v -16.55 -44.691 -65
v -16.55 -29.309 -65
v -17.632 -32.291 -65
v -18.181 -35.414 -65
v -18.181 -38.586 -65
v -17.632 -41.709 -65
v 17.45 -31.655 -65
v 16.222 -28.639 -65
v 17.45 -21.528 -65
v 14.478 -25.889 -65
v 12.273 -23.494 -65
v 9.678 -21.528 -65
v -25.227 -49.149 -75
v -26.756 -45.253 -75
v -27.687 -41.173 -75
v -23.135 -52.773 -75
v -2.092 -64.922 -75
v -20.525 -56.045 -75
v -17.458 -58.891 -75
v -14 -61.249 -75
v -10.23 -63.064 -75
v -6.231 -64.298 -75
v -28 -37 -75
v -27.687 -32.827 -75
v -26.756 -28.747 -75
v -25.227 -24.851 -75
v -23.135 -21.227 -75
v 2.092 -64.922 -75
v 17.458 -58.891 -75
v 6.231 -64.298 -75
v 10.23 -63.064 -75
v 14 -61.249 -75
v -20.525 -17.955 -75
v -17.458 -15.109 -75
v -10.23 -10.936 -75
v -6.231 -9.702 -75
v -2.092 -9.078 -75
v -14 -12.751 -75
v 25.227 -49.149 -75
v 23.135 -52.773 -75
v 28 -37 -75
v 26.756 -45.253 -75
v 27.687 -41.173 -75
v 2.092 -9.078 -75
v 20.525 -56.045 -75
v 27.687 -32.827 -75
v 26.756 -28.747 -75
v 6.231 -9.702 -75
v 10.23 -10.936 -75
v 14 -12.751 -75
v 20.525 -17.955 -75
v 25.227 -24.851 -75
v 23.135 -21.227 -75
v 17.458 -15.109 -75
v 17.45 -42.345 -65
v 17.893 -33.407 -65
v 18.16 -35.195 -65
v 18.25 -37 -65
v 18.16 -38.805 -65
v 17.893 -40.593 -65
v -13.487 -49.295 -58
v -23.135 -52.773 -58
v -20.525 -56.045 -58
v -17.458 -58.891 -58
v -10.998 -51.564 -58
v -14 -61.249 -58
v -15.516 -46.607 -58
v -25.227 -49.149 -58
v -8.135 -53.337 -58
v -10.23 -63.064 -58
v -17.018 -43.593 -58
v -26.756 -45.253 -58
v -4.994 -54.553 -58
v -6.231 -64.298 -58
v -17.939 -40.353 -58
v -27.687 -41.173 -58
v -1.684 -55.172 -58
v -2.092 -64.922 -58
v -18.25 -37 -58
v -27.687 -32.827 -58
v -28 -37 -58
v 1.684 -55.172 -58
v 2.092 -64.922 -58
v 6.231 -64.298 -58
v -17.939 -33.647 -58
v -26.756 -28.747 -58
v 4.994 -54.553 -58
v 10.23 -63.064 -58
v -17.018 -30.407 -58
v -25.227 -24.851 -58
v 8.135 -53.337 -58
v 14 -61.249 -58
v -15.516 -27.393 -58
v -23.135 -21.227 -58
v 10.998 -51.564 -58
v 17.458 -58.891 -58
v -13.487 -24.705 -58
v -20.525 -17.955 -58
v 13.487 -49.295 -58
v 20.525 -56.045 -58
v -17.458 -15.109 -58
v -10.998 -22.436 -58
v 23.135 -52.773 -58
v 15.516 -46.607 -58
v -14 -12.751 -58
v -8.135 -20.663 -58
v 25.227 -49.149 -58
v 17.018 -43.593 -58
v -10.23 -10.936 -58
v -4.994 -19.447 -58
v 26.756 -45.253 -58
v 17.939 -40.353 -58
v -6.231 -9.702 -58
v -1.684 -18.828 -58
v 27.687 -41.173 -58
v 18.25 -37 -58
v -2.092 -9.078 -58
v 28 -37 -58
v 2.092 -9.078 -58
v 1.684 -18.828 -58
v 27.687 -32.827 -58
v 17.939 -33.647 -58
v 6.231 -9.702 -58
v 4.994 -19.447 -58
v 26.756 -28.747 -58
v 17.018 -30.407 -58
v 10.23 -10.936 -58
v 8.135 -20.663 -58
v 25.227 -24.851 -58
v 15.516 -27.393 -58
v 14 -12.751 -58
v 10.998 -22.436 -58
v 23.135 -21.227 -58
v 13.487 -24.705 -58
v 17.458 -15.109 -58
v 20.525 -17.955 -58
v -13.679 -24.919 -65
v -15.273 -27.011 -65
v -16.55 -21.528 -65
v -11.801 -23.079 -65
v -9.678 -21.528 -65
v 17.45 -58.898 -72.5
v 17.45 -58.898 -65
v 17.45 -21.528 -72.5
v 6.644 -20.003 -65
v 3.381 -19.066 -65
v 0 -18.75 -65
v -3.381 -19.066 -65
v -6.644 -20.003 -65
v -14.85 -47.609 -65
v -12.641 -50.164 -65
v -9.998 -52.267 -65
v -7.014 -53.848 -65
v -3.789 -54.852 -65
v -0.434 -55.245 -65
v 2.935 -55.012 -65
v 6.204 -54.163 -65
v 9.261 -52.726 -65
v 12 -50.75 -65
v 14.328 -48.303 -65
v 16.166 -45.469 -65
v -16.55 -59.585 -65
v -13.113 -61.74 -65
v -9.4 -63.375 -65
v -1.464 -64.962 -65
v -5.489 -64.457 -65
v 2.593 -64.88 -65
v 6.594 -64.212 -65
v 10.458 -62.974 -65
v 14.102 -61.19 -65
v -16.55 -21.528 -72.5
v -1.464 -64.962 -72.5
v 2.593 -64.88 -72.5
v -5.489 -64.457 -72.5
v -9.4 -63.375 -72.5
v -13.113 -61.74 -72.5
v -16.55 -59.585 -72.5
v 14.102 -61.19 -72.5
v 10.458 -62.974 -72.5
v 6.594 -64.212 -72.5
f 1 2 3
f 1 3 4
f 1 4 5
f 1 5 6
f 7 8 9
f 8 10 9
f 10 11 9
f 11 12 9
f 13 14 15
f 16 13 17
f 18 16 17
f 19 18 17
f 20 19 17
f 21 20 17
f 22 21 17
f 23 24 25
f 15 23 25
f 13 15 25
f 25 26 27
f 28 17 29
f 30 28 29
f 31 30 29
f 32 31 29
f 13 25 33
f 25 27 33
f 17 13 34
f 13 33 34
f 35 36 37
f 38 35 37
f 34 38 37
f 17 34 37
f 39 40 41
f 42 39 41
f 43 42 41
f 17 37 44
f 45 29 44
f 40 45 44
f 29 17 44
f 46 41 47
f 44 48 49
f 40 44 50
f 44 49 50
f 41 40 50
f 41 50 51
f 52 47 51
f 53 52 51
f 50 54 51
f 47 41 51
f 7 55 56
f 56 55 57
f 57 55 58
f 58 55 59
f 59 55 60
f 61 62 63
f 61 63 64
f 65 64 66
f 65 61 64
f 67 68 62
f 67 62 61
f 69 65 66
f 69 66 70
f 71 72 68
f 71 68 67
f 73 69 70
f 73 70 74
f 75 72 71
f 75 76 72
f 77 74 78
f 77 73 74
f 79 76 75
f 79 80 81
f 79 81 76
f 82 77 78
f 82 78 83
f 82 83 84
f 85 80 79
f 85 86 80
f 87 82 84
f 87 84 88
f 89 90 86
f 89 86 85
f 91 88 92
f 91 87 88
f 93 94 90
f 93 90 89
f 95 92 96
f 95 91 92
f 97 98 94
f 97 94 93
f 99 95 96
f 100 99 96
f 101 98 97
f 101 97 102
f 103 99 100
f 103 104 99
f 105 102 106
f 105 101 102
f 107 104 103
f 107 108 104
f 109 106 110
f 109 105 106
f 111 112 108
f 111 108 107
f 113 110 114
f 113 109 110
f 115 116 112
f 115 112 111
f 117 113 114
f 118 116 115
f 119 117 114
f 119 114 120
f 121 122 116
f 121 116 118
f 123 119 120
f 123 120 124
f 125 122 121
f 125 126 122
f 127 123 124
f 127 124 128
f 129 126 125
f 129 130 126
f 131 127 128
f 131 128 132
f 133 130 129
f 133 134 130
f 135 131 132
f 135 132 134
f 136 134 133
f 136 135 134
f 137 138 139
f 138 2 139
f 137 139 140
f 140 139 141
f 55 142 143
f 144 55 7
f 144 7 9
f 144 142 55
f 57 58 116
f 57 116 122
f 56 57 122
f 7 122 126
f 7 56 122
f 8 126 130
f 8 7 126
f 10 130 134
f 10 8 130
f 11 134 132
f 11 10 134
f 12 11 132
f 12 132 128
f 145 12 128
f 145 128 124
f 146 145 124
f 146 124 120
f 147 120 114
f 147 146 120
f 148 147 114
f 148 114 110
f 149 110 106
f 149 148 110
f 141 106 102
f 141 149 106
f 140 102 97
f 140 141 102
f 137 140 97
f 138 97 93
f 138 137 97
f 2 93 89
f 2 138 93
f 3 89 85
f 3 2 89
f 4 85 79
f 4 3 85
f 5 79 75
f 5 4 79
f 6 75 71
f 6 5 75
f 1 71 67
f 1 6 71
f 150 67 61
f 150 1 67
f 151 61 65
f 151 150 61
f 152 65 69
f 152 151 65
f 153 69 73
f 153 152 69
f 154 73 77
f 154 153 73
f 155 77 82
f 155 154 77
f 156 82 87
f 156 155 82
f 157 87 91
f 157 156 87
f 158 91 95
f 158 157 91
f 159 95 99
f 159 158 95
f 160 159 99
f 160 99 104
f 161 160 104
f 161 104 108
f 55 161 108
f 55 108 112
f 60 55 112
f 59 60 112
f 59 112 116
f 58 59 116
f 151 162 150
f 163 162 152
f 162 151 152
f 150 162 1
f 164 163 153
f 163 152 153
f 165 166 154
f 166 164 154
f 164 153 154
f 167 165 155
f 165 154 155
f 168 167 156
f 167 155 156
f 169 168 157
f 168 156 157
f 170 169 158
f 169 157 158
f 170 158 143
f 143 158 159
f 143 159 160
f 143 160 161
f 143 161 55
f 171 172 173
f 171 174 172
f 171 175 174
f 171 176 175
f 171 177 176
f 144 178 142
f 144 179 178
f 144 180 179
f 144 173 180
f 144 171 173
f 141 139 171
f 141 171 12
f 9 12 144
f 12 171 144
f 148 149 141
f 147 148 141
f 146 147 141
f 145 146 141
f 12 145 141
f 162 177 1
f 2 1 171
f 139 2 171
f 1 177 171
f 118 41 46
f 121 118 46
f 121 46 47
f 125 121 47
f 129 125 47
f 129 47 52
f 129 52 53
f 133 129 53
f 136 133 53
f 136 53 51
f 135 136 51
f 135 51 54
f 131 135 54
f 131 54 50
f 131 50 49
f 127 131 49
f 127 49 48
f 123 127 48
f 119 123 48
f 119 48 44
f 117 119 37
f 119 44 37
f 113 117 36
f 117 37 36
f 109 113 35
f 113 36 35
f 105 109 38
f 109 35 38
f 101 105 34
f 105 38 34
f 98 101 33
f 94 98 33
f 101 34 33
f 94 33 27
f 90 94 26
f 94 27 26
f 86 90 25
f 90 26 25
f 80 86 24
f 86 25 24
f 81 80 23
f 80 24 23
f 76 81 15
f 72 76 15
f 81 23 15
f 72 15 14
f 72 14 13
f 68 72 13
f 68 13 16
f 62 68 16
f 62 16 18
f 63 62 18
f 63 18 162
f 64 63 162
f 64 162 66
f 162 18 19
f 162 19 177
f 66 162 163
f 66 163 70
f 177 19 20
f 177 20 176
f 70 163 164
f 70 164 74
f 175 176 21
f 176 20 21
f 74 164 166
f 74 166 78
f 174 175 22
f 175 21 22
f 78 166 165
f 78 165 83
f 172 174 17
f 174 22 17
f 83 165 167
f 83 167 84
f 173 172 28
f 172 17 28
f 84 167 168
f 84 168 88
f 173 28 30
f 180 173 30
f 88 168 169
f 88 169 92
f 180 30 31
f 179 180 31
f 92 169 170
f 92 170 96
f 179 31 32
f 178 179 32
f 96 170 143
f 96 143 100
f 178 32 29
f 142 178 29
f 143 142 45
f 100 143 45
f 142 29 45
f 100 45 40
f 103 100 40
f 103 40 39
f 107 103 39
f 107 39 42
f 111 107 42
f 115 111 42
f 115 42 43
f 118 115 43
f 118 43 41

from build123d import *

# Parameters (mm, degrees)
SKETCH025_W  = 34
SKETCH025_H  = 50
PAD023_DEPTH = 7.5
SKETCH017_R  = 18.25
PAD015_DEPTH = 7
SKETCH016_R  = 28
PAD014_DEPTH = 17


with BuildPart() as body026:
    # Sketch025 → Pad023 (new body)
    with BuildSketch(Plane.XY):
        with Locations((0.449597, -4.527582)):
            Rectangle(SKETCH025_W, SKETCH025_H)
    extrude(amount=PAD023_DEPTH)


with BuildPart() as body026_1:
    # Body026 placement: moved
    add(body026.part.moved(Location((0, -42, -72.5))))


with BuildPart() as body016:
    # Sketch017 → Pad015 (new body)
    with BuildSketch(Plane.XY.offset(2)):
        with Locations((0, -34)):
            Circle(SKETCH017_R)
    extrude(amount=PAD015_DEPTH)


with BuildPart() as body016_1:
    # Body016 placement: moved
    add(body016.part.moved(Location((0, -3, -67))))


with BuildPart() as bottom:
    # Sketch016 → Pad014 (new body)
    with BuildSketch(Plane.XY):
        with Locations((0, -34)):
            Circle(SKETCH016_R)
    extrude(amount=PAD014_DEPTH)


with BuildPart() as bottom_1:
    # Body015 placement: moved
    add(bottom.part.moved(Location((0, -3, -75))))

    # Cut034: cut Body016
    add(body016_1.part, mode=Mode.SUBTRACT)

    # Cut035: cut Body026
    add(body026_1.part, mode=Mode.SUBTRACT)


solid = bottom_1.part
